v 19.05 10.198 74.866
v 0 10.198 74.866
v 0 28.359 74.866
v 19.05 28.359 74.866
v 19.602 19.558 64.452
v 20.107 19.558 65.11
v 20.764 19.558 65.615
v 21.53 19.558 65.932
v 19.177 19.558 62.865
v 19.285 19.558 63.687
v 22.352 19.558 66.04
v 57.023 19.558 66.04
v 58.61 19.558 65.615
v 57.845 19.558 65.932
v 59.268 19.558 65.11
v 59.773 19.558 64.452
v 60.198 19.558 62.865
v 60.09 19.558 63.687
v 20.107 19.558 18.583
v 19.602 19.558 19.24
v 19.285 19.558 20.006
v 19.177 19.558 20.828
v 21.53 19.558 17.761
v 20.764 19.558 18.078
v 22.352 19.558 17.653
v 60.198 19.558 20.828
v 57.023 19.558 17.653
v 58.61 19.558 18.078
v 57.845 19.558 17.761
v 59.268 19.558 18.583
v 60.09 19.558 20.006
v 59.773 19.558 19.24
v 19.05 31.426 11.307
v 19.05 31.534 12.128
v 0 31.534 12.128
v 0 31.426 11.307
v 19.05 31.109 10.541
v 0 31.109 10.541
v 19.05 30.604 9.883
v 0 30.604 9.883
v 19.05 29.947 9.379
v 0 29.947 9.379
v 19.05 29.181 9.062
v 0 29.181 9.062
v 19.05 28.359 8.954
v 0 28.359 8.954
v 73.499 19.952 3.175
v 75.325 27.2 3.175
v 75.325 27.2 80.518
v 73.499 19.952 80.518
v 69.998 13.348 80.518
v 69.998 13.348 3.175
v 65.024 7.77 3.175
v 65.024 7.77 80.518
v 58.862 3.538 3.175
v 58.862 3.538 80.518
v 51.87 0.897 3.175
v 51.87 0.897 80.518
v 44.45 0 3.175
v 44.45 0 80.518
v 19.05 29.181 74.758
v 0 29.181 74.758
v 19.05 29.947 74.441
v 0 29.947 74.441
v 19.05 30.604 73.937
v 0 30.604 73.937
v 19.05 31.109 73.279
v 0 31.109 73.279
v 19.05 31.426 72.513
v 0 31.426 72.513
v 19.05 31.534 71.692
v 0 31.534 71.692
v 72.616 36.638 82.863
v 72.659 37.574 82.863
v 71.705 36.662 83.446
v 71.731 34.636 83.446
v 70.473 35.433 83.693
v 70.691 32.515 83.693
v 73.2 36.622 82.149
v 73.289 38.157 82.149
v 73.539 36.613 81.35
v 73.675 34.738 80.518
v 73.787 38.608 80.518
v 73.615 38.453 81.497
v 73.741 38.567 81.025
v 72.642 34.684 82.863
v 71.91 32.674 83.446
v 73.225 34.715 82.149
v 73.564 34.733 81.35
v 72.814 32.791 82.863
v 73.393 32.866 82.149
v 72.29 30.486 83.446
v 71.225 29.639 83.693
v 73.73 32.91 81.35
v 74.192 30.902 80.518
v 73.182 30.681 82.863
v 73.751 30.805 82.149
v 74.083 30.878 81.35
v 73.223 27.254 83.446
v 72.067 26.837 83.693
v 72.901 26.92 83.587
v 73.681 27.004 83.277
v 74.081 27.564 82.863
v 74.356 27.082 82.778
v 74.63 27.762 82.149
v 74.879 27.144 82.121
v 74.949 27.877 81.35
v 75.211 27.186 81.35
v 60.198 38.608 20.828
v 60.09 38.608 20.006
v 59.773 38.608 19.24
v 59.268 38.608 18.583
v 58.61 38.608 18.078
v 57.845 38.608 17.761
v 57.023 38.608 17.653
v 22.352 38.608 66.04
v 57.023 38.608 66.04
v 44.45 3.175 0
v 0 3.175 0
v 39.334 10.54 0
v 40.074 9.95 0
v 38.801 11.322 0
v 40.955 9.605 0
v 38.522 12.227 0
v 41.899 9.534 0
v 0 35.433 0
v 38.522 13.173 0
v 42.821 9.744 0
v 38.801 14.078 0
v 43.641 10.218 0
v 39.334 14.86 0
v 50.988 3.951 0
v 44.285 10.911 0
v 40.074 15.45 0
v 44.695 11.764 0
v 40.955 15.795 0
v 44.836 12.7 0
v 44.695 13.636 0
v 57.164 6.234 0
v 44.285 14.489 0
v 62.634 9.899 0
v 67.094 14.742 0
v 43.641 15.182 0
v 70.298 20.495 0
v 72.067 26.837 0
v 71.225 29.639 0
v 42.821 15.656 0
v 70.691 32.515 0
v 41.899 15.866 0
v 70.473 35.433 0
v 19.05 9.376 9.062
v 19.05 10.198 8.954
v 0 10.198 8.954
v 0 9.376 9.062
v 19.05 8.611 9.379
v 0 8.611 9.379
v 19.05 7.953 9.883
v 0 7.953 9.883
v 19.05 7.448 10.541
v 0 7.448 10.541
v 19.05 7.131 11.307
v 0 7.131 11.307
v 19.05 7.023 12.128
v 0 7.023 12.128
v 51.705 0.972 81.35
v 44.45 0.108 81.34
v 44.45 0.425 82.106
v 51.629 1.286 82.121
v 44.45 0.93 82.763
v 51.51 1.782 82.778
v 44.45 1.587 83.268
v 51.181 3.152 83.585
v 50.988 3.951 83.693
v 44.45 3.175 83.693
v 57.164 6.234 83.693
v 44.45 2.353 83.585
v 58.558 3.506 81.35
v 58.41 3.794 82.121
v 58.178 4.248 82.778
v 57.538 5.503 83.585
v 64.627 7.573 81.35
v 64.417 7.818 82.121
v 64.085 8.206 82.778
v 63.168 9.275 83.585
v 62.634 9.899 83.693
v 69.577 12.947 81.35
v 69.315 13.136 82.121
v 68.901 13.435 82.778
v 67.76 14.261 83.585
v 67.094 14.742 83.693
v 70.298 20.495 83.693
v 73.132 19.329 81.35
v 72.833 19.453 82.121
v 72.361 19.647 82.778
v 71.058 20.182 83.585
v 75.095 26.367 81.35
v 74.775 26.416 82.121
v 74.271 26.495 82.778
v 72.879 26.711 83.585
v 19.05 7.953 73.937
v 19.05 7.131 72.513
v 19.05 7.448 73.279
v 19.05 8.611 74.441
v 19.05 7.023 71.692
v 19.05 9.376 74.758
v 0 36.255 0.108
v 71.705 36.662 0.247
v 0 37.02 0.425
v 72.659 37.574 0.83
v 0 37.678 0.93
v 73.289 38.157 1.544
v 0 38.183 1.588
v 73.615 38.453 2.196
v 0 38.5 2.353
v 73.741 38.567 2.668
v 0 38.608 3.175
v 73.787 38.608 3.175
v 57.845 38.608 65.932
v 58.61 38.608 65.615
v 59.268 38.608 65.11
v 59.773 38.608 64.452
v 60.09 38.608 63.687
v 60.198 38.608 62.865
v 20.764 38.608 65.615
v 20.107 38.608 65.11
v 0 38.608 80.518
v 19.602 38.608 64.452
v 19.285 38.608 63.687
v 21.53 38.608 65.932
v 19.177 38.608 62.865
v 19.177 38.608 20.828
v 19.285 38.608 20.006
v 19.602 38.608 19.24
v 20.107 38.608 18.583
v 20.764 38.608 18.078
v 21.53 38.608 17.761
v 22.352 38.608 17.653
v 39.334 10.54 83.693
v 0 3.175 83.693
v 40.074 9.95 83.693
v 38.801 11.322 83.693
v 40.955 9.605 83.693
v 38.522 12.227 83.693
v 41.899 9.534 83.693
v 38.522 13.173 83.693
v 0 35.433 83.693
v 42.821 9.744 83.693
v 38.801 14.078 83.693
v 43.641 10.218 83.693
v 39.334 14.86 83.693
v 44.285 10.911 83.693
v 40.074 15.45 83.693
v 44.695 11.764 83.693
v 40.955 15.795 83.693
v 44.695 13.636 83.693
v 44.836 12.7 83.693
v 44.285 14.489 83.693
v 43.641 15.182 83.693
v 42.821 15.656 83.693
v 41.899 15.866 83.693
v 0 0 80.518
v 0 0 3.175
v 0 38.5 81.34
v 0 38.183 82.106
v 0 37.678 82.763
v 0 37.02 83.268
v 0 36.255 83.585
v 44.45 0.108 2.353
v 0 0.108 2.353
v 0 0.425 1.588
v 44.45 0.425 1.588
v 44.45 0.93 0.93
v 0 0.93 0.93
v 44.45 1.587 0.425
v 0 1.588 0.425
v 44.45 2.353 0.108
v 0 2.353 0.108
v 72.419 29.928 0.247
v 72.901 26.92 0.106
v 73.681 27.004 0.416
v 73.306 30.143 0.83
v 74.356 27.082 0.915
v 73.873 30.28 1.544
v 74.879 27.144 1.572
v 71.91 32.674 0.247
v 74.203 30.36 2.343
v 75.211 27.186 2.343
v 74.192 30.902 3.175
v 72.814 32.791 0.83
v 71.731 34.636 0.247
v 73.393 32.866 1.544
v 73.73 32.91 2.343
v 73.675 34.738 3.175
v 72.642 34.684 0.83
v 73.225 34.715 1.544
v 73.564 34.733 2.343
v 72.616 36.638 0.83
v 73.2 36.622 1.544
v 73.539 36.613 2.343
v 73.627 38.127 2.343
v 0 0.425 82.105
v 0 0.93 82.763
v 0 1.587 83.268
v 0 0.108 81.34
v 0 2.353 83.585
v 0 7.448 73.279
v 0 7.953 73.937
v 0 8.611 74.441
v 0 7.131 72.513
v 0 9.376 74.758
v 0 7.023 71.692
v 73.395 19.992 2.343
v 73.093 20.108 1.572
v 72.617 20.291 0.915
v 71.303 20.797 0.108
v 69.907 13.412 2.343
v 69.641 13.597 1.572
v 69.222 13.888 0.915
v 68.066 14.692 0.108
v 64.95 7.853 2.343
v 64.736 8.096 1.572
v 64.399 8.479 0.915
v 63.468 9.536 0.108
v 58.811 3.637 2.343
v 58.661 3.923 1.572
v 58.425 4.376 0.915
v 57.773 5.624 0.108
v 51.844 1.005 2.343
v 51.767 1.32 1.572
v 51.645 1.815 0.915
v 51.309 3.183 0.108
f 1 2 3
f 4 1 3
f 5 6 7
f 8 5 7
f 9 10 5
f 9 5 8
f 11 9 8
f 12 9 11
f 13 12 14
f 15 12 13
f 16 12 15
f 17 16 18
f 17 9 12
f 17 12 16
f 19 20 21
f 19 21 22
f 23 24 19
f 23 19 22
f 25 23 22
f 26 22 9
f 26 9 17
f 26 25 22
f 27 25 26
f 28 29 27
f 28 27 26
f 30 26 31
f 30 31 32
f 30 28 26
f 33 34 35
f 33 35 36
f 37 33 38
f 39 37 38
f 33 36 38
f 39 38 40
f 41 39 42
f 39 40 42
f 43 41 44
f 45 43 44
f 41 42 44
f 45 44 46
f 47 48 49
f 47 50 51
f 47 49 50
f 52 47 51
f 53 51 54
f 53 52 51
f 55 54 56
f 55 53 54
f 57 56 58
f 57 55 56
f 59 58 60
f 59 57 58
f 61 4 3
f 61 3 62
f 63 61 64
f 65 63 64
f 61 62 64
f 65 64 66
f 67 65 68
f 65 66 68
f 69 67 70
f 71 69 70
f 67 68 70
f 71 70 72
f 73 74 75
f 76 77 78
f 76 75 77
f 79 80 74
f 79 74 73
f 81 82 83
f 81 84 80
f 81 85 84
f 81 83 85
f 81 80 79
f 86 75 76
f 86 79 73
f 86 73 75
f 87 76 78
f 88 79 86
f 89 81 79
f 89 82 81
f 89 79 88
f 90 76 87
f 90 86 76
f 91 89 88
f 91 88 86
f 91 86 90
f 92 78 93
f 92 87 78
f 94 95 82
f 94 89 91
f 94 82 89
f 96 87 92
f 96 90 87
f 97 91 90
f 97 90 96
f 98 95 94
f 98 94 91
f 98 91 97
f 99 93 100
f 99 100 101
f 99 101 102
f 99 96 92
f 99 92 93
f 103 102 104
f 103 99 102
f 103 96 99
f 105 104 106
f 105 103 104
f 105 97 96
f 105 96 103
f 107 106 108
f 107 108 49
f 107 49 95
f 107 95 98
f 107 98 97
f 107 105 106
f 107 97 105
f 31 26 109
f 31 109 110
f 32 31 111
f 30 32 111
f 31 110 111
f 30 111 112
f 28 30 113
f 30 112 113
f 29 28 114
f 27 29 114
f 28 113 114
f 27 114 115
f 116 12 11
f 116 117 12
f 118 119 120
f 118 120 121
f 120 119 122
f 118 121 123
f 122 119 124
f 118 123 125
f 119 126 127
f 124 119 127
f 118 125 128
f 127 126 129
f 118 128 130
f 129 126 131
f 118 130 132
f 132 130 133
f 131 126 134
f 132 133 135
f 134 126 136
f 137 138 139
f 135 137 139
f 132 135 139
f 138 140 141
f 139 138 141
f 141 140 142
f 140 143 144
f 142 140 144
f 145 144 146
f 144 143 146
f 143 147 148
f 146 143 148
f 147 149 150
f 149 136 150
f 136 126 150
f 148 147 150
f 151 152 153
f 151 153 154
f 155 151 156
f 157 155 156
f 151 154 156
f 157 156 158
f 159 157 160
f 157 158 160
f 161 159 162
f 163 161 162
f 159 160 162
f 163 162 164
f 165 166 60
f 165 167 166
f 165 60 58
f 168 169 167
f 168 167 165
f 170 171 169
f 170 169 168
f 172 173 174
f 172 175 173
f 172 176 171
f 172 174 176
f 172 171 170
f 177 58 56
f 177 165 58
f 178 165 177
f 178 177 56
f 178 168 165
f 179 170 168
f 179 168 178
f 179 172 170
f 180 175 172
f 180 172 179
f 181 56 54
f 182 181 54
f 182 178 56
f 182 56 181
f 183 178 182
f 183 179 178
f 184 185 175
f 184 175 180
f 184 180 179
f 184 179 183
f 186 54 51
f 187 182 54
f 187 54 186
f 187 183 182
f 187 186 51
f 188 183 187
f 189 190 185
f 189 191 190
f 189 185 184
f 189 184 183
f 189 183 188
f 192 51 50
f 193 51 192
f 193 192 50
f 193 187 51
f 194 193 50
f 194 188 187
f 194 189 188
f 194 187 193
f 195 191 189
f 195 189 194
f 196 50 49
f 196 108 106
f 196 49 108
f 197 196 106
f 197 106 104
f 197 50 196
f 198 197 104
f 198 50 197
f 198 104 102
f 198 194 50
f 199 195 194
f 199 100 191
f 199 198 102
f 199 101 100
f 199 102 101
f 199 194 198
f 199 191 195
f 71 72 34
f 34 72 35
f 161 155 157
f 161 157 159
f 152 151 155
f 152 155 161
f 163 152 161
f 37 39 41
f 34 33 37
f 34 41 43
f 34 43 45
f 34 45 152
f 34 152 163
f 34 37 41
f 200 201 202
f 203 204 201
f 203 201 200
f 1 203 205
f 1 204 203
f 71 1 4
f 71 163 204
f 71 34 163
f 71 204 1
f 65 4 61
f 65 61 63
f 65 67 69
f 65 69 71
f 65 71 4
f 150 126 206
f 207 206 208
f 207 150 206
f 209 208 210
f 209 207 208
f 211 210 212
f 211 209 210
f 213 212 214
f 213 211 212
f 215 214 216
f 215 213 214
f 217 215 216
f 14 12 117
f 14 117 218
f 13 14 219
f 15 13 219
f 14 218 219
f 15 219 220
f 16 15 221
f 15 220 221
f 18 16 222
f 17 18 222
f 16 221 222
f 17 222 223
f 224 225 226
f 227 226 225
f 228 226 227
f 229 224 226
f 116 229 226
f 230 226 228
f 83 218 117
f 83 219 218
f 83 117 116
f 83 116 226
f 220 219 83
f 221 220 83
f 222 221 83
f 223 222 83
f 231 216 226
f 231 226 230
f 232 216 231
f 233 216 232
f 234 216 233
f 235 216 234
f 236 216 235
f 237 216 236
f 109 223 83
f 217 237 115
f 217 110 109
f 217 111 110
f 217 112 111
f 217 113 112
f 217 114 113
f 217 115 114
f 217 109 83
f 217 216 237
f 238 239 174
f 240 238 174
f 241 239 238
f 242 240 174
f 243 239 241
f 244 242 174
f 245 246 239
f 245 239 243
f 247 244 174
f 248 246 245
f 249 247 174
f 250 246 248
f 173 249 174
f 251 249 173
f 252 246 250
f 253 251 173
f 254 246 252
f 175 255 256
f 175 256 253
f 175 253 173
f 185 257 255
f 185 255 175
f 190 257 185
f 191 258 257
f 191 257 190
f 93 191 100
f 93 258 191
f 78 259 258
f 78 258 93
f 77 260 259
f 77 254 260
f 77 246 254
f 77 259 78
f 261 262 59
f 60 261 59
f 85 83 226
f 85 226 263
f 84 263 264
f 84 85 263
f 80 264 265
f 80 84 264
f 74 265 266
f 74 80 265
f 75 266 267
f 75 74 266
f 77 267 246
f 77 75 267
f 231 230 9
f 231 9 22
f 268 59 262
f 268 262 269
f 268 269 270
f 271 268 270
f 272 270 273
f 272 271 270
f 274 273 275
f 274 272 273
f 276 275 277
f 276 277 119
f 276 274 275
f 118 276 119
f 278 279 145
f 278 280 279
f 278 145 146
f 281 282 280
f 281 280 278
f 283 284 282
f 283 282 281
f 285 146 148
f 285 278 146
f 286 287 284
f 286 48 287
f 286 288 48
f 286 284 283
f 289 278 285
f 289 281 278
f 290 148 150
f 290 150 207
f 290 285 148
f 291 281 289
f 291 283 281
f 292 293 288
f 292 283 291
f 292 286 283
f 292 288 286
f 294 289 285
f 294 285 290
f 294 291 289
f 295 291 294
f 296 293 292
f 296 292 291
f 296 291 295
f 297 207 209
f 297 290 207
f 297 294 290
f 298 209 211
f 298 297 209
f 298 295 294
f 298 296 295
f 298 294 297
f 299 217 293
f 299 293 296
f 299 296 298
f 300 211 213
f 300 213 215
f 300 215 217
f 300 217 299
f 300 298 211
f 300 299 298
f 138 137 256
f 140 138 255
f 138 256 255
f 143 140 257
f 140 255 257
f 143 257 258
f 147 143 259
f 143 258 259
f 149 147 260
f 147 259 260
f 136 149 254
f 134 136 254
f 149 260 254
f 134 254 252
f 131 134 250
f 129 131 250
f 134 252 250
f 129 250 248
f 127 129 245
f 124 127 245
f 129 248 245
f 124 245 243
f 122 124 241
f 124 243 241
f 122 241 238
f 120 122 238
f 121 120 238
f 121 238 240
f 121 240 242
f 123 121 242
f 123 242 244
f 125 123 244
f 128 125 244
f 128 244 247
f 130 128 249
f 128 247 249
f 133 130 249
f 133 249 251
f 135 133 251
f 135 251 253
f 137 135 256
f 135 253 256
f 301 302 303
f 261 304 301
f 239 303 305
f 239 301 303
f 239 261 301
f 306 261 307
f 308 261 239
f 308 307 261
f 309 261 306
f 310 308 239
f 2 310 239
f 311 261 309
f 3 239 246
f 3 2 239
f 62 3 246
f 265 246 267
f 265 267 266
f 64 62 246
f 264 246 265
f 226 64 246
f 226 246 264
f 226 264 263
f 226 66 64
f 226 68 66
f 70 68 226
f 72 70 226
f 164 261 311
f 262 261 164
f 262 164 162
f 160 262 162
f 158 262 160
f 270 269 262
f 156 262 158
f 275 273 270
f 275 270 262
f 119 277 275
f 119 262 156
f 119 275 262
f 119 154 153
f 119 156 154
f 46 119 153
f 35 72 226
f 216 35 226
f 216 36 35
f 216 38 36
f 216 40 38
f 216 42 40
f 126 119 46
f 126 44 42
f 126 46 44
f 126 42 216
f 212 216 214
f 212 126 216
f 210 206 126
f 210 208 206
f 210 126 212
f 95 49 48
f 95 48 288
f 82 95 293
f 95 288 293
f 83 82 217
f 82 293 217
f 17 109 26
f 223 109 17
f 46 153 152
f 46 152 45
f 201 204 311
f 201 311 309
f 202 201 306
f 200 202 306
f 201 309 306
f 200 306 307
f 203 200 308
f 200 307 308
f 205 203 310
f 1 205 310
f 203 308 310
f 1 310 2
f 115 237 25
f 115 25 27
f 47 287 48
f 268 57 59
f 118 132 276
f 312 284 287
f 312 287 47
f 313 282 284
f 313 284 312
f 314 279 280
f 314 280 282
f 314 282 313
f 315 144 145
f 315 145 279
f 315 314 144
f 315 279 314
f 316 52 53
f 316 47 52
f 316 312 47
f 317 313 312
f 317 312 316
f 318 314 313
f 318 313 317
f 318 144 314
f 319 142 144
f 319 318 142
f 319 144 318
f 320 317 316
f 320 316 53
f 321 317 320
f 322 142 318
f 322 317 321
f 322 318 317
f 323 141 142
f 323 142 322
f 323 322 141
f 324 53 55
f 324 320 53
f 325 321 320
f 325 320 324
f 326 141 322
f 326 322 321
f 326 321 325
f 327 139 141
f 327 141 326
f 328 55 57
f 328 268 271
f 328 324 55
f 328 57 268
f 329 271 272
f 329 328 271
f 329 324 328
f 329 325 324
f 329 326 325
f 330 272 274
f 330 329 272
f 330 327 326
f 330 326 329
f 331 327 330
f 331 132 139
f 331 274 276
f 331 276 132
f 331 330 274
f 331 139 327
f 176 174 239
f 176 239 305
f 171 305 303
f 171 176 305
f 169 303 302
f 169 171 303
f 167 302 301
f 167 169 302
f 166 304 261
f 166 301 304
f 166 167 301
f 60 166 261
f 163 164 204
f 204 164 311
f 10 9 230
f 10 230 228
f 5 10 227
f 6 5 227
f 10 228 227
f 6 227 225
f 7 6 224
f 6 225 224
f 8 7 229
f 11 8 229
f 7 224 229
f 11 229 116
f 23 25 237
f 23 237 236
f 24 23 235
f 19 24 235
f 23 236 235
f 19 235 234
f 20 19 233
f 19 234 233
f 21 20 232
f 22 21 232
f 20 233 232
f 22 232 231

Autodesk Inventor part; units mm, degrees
ref_plane "YZ Plane" through (0, 0, 0) normal (1, 0, 0) x (0, 1, 0)
ref_plane "XZ Plane" through (0, 0, 0) normal (0, 1, 0) x (-1, 0, 0)
ref_plane "XY Plane" through (0, 0, 0) normal (0, 0, 1) x (1, 0, 0)
sketch "Sketch1" plane through (0, 0, 0) normal (0, 0, 1) x (1, 0, 0)
  line L0 (0, 0) -> (0, 38.608)
  line L1 (0, 38.608) -> (73.787, 38.608)
  arc A0 (73.787, 38.608) -> (75.3246, 27.2) centre (97.4163, 35.9853) ccw
  line L2 (0, 0) -> (44.45, 0)
  arc A1 (44.45, 0) -> (75.3246, 27.2) centre (44.45, 31.1228) ccw
  dimension "d1" = 38.608
  dimension "d2" = 73.787
  dimension "d7" = 44.45
extrude "Extrusion1" add sketch "Sketch1" along normal blind 83.693
sketch "Sketch2" plane through (0, 38.608, 0) normal (0, 1, 0) x (1, 0, 0)
  line L0 (0, 0) -> (0, -83.693) projected
  line L1 (0, 0) -> (73.787, 0) projected
  line L2 (0, 0) -> (0, -83.693) projected
  line L3 (73.787, -83.693) -> (0, -83.693) projected
  line L4 (73.787, 0) -> (73.787, -83.693) projected
  line L5 (73.787, 0) -> (73.787, -83.693) projected
  line L6 (73.787, -17.653) -> (60.198, -17.653)
  line L7 (22.352, -17.653) -> (57.023, -17.653)
  line L8 (60.198, -20.828) -> (60.198, -62.865)
  line L9 (57.023, -66.04) -> (22.352, -66.04)
  line L10 (19.177, -62.865) -> (19.177, -20.828)
  arc A0 (22.352, -17.653) -> (19.177, -20.828) centre (22.352, -20.828) ccw
  arc A1 (60.198, -20.828) -> (57.023, -17.653) centre (57.023, -20.828) ccw
  arc A2 (19.177, -62.865) -> (22.352, -66.04) centre (22.352, -62.865) ccw
  arc A3 (57.023, -66.04) -> (60.198, -62.865) centre (57.023, -62.865) ccw
  point P0 (19.177, -17.653)
  point P1 (60.198, -66.04)
  point P2 (19.177, -66.04)
  dimension "d13" = 13.589
  dimension "d14" = 48.387
  dimension "d26" = 41.021
  dimension "d29" = 3.175
extrude "Extrusion2" cut sketch "Sketch2" against normal blind 19.05 contours L7 A1 L8 A3 L9 A2 L10 A0
sketch "Sketch3" plane through (0, 0, 0) normal (-1, 0, 0) x (0, 0, 1)
  line L0 (0, 0) -> (0, 38.608) projected
  line L1 (0, 0) -> (83.693, 0) projected
  line L2 (83.693, 38.608) -> (83.693, 0) projected
  line L3 (0, 38.608) -> (83.693, 38.608) projected
  line L4 (0, 38.608) -> (83.693, 38.608) projected
  line L5 (8.9535, 10.1981) -> (8.9535, 28.3591)
  line L6 (12.1285, 7.0231) -> (71.6915, 7.0231)
  line L7 (74.8665, 10.1981) -> (74.8665, 28.3591)
  line L8 (71.6915, 31.5341) -> (12.1285, 31.5341)
  arc A0 (74.8665, 28.3591) -> (71.6915, 31.5341) centre (71.6915, 28.3591) ccw
  arc A1 (12.1285, 31.5341) -> (8.9535, 28.3591) centre (12.1285, 28.3591) ccw
  arc A2 (8.9535, 10.1981) -> (12.1285, 7.0231) centre (12.1285, 10.1981) ccw
  arc A3 (71.6915, 7.0231) -> (74.8665, 10.1981) centre (71.6915, 10.1981) ccw
  point P0 (8.9535, 7.0231)
  point P1 (8.9535, 31.5341)
  point P2 (74.8665, 7.0231)
  point P3 (74.8665, 31.5341)
  dimension "d20" = 24.511
  dimension "d21" = 65.913
  dimension "d28" = 3.175
extrude "Extrusion3" cut sketch "Sketch3" against normal blind 19.05 contours L5 A1 L8 A0 L7 A3 L6 A2
fillet "Fillet2" radius 3.175 8 edges at (36.8935, 38.608, 83.693) (36.8935, 38.608, 0) (73.8549, 32.8095, 83.693) (22.225, 0, 83.693) (65.0236, 7.7699, 83.693) (73.8549, 32.8095, 0) (22.225, 0, 0) (65.0236, 7.7699, 0)
sketch "Sketch4" plane through (0, 0, 83.693) normal (0, 0, 1) x (1, 0, 0)
  circle A0 centre (41.6613, 12.7) radius 3.175
  line L0 (0, 0) -> (44.45, 0) projected
  dimension "d31" = 6.35
  dimension "d32" = 12.7
extrude "Extrusion4" cut sketch "Sketch4" against normal through all
